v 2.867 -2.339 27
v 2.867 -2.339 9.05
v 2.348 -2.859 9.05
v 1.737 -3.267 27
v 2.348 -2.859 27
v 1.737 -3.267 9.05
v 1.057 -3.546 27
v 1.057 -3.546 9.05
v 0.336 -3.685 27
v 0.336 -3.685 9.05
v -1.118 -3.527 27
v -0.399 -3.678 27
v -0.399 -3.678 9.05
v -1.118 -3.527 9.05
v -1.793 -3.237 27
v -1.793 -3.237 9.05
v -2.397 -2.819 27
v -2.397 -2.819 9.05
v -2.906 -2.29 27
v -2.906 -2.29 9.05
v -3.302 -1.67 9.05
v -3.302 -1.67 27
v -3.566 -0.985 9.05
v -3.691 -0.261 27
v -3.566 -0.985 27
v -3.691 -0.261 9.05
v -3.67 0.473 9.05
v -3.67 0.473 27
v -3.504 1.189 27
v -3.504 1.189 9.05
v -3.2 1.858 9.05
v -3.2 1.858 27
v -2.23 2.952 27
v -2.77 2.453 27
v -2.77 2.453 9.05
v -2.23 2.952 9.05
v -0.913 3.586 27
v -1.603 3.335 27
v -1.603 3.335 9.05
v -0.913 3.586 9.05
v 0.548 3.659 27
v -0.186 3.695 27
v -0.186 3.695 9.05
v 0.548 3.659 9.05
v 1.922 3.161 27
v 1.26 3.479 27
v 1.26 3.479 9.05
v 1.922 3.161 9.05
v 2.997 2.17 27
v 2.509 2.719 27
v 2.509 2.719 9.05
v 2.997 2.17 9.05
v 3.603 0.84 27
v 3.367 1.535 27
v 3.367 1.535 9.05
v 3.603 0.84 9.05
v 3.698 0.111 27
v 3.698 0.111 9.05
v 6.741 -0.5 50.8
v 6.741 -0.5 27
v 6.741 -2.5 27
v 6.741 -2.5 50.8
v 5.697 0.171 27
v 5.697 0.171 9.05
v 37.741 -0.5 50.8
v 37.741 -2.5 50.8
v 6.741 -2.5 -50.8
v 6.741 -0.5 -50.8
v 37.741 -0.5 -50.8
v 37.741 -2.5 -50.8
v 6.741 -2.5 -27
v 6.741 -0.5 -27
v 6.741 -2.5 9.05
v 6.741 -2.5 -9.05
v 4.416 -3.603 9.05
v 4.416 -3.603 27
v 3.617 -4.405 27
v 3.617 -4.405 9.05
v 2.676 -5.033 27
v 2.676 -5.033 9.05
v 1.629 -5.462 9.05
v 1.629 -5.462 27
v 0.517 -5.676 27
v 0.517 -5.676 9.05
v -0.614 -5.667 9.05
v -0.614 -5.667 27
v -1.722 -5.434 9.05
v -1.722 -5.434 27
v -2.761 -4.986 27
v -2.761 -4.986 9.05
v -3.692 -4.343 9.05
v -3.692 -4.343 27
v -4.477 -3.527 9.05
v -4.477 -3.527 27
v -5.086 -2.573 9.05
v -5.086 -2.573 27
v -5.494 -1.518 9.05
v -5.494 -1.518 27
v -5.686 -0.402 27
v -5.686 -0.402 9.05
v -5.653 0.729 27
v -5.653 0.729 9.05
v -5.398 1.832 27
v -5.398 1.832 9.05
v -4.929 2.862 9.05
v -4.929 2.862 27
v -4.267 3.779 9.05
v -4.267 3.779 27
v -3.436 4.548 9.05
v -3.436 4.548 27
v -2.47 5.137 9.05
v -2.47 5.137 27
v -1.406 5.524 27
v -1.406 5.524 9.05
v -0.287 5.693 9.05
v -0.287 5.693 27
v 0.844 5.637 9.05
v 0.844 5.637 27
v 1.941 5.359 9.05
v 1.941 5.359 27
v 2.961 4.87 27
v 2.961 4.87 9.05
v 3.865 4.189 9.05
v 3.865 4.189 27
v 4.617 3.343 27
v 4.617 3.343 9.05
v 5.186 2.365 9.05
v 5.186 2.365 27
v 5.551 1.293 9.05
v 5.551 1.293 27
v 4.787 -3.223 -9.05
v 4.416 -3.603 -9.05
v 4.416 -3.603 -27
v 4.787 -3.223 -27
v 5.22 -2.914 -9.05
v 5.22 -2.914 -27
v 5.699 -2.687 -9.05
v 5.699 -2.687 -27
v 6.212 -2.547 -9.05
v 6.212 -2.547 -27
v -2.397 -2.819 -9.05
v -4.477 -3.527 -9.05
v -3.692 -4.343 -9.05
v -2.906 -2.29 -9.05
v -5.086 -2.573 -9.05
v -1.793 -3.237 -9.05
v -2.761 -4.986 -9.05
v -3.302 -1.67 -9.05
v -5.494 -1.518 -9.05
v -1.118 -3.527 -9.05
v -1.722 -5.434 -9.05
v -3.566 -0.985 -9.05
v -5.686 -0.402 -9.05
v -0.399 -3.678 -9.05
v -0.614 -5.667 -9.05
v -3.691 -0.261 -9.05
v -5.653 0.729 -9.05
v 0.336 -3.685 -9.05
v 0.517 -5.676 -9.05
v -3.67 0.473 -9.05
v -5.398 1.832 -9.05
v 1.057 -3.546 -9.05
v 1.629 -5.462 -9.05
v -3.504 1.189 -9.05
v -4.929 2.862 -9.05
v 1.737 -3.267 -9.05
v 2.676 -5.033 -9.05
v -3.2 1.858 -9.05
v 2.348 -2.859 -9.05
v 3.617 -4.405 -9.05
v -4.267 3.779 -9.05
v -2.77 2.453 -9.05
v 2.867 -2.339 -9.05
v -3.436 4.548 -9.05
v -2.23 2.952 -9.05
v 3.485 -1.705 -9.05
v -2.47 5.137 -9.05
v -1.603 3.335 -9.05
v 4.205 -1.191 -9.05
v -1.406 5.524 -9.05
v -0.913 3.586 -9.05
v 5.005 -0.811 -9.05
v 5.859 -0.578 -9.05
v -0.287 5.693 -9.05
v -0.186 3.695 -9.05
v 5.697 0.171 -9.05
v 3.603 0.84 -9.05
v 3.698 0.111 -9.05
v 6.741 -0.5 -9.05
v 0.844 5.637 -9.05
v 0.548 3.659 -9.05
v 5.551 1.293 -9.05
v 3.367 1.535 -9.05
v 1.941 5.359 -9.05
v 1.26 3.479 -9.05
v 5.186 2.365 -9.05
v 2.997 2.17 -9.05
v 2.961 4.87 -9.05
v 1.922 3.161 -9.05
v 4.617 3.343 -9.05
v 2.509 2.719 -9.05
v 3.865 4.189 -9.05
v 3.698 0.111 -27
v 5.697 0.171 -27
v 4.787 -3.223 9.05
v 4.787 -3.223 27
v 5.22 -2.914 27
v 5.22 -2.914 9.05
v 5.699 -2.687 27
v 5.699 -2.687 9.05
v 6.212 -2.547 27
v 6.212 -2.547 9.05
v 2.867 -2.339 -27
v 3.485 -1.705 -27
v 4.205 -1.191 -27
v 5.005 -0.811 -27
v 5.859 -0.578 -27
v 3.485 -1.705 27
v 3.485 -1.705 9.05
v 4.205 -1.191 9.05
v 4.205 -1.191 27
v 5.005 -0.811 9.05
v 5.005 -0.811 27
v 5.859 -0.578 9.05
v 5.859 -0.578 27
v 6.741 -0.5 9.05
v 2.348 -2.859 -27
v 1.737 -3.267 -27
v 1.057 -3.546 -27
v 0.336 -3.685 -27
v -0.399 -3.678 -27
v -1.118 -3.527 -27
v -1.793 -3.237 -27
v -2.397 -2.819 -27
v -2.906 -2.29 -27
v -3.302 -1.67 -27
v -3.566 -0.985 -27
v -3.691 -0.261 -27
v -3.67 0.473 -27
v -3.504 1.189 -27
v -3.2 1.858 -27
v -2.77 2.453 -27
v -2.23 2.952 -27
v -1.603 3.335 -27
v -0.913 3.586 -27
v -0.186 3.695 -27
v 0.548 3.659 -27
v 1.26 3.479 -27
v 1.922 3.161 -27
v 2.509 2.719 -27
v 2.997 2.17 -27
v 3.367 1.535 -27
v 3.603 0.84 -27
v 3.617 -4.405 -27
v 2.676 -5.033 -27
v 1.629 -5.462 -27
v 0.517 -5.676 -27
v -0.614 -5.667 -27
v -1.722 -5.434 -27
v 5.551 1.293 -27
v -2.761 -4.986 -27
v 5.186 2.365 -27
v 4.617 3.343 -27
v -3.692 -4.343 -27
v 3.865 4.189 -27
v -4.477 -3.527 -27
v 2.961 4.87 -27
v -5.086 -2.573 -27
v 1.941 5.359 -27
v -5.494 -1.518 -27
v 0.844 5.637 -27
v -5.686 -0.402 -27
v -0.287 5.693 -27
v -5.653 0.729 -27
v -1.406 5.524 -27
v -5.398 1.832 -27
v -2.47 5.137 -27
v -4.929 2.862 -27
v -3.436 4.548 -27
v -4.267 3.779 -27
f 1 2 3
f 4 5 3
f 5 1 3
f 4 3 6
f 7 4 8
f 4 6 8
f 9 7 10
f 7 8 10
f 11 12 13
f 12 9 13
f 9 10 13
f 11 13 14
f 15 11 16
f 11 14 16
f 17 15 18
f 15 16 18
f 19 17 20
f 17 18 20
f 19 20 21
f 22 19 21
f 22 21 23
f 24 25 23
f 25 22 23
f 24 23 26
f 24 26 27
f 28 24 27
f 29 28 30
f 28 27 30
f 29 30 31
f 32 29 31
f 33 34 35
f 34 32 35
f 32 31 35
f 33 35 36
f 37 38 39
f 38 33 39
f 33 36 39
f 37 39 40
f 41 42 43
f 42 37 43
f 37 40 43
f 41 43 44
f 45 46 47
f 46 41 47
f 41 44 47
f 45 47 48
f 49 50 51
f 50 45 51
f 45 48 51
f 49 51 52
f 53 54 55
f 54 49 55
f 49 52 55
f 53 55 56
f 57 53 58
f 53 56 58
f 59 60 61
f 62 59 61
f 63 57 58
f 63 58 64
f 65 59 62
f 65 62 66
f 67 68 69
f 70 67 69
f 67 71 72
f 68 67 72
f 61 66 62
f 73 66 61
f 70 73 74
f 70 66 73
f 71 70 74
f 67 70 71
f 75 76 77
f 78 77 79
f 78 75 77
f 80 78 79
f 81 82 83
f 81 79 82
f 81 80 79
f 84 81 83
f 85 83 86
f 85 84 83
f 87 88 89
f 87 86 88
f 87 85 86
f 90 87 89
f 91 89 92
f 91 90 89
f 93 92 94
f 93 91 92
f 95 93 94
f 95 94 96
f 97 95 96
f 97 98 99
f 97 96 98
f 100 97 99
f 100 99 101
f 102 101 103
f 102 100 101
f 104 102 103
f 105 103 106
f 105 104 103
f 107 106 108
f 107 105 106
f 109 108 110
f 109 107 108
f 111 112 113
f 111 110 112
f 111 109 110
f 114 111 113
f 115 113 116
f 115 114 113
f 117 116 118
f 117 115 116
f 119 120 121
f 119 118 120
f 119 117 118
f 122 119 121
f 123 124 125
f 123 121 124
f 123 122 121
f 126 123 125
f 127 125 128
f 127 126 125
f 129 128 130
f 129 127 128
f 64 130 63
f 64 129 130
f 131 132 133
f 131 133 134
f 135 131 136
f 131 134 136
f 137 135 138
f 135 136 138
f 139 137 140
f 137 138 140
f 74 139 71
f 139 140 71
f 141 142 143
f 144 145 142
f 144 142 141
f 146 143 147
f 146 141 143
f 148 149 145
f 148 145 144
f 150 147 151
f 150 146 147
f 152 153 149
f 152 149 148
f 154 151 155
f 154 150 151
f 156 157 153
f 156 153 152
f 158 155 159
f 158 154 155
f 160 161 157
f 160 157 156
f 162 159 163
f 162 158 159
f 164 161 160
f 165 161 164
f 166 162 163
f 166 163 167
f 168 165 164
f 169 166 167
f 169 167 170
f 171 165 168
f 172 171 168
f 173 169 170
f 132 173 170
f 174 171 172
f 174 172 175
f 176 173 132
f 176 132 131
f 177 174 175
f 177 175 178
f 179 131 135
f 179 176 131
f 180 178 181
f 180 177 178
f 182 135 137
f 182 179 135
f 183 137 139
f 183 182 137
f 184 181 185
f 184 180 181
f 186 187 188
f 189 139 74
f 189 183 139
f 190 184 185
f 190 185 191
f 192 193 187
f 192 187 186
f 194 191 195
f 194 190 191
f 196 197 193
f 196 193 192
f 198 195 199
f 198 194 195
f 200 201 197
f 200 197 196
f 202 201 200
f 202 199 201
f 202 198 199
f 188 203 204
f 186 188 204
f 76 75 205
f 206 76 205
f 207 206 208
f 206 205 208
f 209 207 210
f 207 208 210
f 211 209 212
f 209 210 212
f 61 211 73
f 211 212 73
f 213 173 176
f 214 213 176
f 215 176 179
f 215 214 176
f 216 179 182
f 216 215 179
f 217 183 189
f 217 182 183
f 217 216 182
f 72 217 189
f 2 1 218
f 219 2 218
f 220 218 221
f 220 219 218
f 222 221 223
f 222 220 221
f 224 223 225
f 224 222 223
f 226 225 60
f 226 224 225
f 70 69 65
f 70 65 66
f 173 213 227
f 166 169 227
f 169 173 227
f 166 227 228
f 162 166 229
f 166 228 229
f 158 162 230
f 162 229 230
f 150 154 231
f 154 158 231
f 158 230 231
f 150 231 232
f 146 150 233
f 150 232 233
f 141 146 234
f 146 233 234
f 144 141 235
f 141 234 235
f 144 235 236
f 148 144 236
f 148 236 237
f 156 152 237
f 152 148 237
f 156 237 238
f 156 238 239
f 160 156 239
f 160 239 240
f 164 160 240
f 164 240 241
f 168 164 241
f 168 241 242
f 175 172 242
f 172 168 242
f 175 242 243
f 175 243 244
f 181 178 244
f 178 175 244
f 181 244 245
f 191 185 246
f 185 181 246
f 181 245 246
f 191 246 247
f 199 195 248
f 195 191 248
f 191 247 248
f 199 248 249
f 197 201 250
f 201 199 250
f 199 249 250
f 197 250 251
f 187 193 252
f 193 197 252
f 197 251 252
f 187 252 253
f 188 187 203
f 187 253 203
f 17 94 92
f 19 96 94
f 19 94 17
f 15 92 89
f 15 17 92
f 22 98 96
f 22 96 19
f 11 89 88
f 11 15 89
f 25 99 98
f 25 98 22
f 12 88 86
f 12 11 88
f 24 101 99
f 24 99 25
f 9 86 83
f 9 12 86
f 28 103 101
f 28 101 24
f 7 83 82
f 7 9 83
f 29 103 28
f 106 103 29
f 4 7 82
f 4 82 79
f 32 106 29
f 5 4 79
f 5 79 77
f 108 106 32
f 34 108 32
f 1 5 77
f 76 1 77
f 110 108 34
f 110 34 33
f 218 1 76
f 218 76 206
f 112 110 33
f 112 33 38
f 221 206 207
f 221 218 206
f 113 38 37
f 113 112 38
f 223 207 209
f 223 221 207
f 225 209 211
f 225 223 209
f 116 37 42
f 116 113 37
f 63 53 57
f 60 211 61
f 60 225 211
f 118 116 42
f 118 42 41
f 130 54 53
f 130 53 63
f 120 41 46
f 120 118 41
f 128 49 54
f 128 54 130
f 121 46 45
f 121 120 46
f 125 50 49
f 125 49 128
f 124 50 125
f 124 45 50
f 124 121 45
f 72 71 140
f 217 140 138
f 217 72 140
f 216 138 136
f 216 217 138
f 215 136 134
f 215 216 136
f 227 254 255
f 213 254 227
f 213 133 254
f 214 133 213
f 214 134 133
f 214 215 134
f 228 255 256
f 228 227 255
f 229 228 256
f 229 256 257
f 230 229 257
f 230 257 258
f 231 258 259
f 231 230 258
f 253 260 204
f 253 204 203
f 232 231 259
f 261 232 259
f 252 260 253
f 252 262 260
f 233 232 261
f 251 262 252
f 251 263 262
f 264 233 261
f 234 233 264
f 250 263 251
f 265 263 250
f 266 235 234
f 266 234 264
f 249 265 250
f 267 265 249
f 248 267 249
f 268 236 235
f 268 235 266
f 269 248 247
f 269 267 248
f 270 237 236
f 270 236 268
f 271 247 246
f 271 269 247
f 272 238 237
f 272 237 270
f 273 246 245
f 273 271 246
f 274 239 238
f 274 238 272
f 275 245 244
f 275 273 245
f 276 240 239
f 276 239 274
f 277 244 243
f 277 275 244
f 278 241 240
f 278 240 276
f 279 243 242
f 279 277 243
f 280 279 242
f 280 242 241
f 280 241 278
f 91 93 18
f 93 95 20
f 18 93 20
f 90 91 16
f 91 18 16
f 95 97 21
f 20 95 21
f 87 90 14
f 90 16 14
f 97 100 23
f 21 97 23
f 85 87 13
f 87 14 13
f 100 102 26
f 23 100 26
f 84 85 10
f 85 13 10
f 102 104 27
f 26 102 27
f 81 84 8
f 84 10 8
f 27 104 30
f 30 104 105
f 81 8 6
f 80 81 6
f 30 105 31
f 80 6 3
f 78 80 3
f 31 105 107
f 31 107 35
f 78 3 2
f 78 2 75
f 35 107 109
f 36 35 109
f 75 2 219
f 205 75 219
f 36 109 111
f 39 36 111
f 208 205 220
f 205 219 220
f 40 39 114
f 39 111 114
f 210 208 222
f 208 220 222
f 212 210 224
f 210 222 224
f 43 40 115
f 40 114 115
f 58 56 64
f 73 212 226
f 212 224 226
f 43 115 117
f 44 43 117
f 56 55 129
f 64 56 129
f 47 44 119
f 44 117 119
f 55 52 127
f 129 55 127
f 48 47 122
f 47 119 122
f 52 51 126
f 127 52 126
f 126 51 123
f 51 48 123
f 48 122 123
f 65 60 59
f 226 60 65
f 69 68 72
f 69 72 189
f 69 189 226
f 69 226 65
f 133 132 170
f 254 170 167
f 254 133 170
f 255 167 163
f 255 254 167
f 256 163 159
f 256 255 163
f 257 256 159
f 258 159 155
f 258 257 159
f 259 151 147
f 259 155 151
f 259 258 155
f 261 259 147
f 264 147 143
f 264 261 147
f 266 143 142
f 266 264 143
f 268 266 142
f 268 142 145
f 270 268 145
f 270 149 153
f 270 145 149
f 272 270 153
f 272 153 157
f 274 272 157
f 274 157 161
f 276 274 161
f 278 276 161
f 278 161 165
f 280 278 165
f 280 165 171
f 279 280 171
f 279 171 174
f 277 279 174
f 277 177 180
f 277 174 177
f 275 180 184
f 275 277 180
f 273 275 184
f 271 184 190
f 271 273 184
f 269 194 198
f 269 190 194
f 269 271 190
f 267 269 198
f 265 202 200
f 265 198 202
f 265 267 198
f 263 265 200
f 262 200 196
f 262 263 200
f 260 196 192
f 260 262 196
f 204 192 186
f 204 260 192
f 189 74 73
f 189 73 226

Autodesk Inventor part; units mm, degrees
ref_plane "YZ Plane" through (0, 0, 0) normal (1, 0, 0) x (0, 1, 0)
ref_plane "XZ Plane" through (0, 0, 0) normal (0, 1, 0) x (-1, 0, 0)
sketch "Sketch1" plane through (0, 0, 0) normal (0, 0, 1) x (1, 0, 0)
  arc A0 (5.6974, 0.1712) -> (4.4165, -3.6034) centre (0, 0) ccw
  line L0 (37.7409, -2.5) -> (6.7409, -2.5)
  arc A1 (3.6983, 0.1111) -> (2.8668, -2.3391) centre (0, 0) ccw
  line L1 (6.7409, -0.5) -> (37.7409, -0.5)
  line L2 (37.7409, -0.5) -> (37.7409, -2.5)
  arc A2 (6.7409, -2.5) -> (4.4165, -3.6034) centre (6.7409, -5.5) ccw
  arc A3 (6.7409, -0.5) -> (2.8668, -2.3391) centre (6.7409, -5.5) ccw
  line L3 (3.6983, 0.1111) -> (5.6974, 0.1712)
  point P0 (5.1225, -2.5)
  dimension "d0" = 11.4
  dimension "d1" = 2
  dimension "d2" = 3
  dimension "d3" = 5
  dimension "d4" = 2
  dimension "d5" = 31
  dimension "d8" = 0.5
  dimension "d9" = 0.7
extrude "Extrusion1" add sketch "Sketch1" along normal mid plane 101.6
ref_plane "Work Plane1" through (0, 0, 27) normal (0, 0, 1) x (1, 0, 0)
sketch "Sketch2" plane through (0, 0, 27) normal (0, 0, 1) x (1, 0, 0)
  arc A0 (6.7409, -2.5) -> (4.4165, -3.6034) centre (6.7409, -5.5) ccw projected
  arc A1 (5.6974, 0.1712) -> (4.4165, -3.6034) centre (0, 0) ccw projected
  line L0 (5.6974, 0.1712) -> (3.6983, 0.1111) projected
  arc A2 (3.6983, 0.1111) -> (2.8668, -2.3391) centre (0, 0) ccw projected
  arc A3 (6.7409, -0.5) -> (2.8668, -2.3391) centre (6.7409, -5.5) ccw projected
  line L1 (6.7409, -0.5) -> (37.7409, -0.5) construction
  line L2 (37.7409, -0.5) -> (37.7409, -2.5) construction
  line L3 (37.7409, -2.5) -> (6.7409, -2.5) construction
  line L4 (6.7409, -0.5) -> (6.7409, -2.5)
extrude "Extrusion2" cut sketch "Sketch2" along normal through all
mirror "Mirror1" about plane through (0, 0, 0) normal (0, 0, 1) of "Extrusion2"
sketch "Sketch3" plane through (0, 0, 0) normal (0, 0, 1) x (1, 0, 0)
  arc A0 (6.7409, -0.5) -> (2.8668, -2.3391) centre (6.7409, -5.5) ccw projected
  line L0 (6.7409, -0.5) -> (37.7409, -0.5) construction
  line L1 (37.7409, -0.5) -> (37.7409, -2.5) projected
  line L2 (37.7409, -2.5) -> (6.7409, -2.5) construction
  arc A1 (6.7409, -2.5) -> (4.4165, -3.6034) centre (6.7409, -5.5) ccw projected
  arc A2 (5.6974, 0.1712) -> (4.4165, -3.6034) centre (0, 0) ccw projected
  line L3 (5.6974, 0.1712) -> (3.6983, 0.1111) projected
  arc A3 (3.6983, 0.1111) -> (2.8668, -2.3391) centre (0, 0) ccw projected
  line L4 (6.7409, -2.5) -> (6.7409, -0.5) projected
  line L5 (6.7409, -2.5) -> (6.7409, -0.5)
extrude "Extrusion3" cut sketch "Sketch3" along normal mid plane 18.1
equation "\"d1\" = d4"
equation "\"d3\" = d2 + d4"
properties part number "HINGE PLATE 2" material "Stainless Steel"
